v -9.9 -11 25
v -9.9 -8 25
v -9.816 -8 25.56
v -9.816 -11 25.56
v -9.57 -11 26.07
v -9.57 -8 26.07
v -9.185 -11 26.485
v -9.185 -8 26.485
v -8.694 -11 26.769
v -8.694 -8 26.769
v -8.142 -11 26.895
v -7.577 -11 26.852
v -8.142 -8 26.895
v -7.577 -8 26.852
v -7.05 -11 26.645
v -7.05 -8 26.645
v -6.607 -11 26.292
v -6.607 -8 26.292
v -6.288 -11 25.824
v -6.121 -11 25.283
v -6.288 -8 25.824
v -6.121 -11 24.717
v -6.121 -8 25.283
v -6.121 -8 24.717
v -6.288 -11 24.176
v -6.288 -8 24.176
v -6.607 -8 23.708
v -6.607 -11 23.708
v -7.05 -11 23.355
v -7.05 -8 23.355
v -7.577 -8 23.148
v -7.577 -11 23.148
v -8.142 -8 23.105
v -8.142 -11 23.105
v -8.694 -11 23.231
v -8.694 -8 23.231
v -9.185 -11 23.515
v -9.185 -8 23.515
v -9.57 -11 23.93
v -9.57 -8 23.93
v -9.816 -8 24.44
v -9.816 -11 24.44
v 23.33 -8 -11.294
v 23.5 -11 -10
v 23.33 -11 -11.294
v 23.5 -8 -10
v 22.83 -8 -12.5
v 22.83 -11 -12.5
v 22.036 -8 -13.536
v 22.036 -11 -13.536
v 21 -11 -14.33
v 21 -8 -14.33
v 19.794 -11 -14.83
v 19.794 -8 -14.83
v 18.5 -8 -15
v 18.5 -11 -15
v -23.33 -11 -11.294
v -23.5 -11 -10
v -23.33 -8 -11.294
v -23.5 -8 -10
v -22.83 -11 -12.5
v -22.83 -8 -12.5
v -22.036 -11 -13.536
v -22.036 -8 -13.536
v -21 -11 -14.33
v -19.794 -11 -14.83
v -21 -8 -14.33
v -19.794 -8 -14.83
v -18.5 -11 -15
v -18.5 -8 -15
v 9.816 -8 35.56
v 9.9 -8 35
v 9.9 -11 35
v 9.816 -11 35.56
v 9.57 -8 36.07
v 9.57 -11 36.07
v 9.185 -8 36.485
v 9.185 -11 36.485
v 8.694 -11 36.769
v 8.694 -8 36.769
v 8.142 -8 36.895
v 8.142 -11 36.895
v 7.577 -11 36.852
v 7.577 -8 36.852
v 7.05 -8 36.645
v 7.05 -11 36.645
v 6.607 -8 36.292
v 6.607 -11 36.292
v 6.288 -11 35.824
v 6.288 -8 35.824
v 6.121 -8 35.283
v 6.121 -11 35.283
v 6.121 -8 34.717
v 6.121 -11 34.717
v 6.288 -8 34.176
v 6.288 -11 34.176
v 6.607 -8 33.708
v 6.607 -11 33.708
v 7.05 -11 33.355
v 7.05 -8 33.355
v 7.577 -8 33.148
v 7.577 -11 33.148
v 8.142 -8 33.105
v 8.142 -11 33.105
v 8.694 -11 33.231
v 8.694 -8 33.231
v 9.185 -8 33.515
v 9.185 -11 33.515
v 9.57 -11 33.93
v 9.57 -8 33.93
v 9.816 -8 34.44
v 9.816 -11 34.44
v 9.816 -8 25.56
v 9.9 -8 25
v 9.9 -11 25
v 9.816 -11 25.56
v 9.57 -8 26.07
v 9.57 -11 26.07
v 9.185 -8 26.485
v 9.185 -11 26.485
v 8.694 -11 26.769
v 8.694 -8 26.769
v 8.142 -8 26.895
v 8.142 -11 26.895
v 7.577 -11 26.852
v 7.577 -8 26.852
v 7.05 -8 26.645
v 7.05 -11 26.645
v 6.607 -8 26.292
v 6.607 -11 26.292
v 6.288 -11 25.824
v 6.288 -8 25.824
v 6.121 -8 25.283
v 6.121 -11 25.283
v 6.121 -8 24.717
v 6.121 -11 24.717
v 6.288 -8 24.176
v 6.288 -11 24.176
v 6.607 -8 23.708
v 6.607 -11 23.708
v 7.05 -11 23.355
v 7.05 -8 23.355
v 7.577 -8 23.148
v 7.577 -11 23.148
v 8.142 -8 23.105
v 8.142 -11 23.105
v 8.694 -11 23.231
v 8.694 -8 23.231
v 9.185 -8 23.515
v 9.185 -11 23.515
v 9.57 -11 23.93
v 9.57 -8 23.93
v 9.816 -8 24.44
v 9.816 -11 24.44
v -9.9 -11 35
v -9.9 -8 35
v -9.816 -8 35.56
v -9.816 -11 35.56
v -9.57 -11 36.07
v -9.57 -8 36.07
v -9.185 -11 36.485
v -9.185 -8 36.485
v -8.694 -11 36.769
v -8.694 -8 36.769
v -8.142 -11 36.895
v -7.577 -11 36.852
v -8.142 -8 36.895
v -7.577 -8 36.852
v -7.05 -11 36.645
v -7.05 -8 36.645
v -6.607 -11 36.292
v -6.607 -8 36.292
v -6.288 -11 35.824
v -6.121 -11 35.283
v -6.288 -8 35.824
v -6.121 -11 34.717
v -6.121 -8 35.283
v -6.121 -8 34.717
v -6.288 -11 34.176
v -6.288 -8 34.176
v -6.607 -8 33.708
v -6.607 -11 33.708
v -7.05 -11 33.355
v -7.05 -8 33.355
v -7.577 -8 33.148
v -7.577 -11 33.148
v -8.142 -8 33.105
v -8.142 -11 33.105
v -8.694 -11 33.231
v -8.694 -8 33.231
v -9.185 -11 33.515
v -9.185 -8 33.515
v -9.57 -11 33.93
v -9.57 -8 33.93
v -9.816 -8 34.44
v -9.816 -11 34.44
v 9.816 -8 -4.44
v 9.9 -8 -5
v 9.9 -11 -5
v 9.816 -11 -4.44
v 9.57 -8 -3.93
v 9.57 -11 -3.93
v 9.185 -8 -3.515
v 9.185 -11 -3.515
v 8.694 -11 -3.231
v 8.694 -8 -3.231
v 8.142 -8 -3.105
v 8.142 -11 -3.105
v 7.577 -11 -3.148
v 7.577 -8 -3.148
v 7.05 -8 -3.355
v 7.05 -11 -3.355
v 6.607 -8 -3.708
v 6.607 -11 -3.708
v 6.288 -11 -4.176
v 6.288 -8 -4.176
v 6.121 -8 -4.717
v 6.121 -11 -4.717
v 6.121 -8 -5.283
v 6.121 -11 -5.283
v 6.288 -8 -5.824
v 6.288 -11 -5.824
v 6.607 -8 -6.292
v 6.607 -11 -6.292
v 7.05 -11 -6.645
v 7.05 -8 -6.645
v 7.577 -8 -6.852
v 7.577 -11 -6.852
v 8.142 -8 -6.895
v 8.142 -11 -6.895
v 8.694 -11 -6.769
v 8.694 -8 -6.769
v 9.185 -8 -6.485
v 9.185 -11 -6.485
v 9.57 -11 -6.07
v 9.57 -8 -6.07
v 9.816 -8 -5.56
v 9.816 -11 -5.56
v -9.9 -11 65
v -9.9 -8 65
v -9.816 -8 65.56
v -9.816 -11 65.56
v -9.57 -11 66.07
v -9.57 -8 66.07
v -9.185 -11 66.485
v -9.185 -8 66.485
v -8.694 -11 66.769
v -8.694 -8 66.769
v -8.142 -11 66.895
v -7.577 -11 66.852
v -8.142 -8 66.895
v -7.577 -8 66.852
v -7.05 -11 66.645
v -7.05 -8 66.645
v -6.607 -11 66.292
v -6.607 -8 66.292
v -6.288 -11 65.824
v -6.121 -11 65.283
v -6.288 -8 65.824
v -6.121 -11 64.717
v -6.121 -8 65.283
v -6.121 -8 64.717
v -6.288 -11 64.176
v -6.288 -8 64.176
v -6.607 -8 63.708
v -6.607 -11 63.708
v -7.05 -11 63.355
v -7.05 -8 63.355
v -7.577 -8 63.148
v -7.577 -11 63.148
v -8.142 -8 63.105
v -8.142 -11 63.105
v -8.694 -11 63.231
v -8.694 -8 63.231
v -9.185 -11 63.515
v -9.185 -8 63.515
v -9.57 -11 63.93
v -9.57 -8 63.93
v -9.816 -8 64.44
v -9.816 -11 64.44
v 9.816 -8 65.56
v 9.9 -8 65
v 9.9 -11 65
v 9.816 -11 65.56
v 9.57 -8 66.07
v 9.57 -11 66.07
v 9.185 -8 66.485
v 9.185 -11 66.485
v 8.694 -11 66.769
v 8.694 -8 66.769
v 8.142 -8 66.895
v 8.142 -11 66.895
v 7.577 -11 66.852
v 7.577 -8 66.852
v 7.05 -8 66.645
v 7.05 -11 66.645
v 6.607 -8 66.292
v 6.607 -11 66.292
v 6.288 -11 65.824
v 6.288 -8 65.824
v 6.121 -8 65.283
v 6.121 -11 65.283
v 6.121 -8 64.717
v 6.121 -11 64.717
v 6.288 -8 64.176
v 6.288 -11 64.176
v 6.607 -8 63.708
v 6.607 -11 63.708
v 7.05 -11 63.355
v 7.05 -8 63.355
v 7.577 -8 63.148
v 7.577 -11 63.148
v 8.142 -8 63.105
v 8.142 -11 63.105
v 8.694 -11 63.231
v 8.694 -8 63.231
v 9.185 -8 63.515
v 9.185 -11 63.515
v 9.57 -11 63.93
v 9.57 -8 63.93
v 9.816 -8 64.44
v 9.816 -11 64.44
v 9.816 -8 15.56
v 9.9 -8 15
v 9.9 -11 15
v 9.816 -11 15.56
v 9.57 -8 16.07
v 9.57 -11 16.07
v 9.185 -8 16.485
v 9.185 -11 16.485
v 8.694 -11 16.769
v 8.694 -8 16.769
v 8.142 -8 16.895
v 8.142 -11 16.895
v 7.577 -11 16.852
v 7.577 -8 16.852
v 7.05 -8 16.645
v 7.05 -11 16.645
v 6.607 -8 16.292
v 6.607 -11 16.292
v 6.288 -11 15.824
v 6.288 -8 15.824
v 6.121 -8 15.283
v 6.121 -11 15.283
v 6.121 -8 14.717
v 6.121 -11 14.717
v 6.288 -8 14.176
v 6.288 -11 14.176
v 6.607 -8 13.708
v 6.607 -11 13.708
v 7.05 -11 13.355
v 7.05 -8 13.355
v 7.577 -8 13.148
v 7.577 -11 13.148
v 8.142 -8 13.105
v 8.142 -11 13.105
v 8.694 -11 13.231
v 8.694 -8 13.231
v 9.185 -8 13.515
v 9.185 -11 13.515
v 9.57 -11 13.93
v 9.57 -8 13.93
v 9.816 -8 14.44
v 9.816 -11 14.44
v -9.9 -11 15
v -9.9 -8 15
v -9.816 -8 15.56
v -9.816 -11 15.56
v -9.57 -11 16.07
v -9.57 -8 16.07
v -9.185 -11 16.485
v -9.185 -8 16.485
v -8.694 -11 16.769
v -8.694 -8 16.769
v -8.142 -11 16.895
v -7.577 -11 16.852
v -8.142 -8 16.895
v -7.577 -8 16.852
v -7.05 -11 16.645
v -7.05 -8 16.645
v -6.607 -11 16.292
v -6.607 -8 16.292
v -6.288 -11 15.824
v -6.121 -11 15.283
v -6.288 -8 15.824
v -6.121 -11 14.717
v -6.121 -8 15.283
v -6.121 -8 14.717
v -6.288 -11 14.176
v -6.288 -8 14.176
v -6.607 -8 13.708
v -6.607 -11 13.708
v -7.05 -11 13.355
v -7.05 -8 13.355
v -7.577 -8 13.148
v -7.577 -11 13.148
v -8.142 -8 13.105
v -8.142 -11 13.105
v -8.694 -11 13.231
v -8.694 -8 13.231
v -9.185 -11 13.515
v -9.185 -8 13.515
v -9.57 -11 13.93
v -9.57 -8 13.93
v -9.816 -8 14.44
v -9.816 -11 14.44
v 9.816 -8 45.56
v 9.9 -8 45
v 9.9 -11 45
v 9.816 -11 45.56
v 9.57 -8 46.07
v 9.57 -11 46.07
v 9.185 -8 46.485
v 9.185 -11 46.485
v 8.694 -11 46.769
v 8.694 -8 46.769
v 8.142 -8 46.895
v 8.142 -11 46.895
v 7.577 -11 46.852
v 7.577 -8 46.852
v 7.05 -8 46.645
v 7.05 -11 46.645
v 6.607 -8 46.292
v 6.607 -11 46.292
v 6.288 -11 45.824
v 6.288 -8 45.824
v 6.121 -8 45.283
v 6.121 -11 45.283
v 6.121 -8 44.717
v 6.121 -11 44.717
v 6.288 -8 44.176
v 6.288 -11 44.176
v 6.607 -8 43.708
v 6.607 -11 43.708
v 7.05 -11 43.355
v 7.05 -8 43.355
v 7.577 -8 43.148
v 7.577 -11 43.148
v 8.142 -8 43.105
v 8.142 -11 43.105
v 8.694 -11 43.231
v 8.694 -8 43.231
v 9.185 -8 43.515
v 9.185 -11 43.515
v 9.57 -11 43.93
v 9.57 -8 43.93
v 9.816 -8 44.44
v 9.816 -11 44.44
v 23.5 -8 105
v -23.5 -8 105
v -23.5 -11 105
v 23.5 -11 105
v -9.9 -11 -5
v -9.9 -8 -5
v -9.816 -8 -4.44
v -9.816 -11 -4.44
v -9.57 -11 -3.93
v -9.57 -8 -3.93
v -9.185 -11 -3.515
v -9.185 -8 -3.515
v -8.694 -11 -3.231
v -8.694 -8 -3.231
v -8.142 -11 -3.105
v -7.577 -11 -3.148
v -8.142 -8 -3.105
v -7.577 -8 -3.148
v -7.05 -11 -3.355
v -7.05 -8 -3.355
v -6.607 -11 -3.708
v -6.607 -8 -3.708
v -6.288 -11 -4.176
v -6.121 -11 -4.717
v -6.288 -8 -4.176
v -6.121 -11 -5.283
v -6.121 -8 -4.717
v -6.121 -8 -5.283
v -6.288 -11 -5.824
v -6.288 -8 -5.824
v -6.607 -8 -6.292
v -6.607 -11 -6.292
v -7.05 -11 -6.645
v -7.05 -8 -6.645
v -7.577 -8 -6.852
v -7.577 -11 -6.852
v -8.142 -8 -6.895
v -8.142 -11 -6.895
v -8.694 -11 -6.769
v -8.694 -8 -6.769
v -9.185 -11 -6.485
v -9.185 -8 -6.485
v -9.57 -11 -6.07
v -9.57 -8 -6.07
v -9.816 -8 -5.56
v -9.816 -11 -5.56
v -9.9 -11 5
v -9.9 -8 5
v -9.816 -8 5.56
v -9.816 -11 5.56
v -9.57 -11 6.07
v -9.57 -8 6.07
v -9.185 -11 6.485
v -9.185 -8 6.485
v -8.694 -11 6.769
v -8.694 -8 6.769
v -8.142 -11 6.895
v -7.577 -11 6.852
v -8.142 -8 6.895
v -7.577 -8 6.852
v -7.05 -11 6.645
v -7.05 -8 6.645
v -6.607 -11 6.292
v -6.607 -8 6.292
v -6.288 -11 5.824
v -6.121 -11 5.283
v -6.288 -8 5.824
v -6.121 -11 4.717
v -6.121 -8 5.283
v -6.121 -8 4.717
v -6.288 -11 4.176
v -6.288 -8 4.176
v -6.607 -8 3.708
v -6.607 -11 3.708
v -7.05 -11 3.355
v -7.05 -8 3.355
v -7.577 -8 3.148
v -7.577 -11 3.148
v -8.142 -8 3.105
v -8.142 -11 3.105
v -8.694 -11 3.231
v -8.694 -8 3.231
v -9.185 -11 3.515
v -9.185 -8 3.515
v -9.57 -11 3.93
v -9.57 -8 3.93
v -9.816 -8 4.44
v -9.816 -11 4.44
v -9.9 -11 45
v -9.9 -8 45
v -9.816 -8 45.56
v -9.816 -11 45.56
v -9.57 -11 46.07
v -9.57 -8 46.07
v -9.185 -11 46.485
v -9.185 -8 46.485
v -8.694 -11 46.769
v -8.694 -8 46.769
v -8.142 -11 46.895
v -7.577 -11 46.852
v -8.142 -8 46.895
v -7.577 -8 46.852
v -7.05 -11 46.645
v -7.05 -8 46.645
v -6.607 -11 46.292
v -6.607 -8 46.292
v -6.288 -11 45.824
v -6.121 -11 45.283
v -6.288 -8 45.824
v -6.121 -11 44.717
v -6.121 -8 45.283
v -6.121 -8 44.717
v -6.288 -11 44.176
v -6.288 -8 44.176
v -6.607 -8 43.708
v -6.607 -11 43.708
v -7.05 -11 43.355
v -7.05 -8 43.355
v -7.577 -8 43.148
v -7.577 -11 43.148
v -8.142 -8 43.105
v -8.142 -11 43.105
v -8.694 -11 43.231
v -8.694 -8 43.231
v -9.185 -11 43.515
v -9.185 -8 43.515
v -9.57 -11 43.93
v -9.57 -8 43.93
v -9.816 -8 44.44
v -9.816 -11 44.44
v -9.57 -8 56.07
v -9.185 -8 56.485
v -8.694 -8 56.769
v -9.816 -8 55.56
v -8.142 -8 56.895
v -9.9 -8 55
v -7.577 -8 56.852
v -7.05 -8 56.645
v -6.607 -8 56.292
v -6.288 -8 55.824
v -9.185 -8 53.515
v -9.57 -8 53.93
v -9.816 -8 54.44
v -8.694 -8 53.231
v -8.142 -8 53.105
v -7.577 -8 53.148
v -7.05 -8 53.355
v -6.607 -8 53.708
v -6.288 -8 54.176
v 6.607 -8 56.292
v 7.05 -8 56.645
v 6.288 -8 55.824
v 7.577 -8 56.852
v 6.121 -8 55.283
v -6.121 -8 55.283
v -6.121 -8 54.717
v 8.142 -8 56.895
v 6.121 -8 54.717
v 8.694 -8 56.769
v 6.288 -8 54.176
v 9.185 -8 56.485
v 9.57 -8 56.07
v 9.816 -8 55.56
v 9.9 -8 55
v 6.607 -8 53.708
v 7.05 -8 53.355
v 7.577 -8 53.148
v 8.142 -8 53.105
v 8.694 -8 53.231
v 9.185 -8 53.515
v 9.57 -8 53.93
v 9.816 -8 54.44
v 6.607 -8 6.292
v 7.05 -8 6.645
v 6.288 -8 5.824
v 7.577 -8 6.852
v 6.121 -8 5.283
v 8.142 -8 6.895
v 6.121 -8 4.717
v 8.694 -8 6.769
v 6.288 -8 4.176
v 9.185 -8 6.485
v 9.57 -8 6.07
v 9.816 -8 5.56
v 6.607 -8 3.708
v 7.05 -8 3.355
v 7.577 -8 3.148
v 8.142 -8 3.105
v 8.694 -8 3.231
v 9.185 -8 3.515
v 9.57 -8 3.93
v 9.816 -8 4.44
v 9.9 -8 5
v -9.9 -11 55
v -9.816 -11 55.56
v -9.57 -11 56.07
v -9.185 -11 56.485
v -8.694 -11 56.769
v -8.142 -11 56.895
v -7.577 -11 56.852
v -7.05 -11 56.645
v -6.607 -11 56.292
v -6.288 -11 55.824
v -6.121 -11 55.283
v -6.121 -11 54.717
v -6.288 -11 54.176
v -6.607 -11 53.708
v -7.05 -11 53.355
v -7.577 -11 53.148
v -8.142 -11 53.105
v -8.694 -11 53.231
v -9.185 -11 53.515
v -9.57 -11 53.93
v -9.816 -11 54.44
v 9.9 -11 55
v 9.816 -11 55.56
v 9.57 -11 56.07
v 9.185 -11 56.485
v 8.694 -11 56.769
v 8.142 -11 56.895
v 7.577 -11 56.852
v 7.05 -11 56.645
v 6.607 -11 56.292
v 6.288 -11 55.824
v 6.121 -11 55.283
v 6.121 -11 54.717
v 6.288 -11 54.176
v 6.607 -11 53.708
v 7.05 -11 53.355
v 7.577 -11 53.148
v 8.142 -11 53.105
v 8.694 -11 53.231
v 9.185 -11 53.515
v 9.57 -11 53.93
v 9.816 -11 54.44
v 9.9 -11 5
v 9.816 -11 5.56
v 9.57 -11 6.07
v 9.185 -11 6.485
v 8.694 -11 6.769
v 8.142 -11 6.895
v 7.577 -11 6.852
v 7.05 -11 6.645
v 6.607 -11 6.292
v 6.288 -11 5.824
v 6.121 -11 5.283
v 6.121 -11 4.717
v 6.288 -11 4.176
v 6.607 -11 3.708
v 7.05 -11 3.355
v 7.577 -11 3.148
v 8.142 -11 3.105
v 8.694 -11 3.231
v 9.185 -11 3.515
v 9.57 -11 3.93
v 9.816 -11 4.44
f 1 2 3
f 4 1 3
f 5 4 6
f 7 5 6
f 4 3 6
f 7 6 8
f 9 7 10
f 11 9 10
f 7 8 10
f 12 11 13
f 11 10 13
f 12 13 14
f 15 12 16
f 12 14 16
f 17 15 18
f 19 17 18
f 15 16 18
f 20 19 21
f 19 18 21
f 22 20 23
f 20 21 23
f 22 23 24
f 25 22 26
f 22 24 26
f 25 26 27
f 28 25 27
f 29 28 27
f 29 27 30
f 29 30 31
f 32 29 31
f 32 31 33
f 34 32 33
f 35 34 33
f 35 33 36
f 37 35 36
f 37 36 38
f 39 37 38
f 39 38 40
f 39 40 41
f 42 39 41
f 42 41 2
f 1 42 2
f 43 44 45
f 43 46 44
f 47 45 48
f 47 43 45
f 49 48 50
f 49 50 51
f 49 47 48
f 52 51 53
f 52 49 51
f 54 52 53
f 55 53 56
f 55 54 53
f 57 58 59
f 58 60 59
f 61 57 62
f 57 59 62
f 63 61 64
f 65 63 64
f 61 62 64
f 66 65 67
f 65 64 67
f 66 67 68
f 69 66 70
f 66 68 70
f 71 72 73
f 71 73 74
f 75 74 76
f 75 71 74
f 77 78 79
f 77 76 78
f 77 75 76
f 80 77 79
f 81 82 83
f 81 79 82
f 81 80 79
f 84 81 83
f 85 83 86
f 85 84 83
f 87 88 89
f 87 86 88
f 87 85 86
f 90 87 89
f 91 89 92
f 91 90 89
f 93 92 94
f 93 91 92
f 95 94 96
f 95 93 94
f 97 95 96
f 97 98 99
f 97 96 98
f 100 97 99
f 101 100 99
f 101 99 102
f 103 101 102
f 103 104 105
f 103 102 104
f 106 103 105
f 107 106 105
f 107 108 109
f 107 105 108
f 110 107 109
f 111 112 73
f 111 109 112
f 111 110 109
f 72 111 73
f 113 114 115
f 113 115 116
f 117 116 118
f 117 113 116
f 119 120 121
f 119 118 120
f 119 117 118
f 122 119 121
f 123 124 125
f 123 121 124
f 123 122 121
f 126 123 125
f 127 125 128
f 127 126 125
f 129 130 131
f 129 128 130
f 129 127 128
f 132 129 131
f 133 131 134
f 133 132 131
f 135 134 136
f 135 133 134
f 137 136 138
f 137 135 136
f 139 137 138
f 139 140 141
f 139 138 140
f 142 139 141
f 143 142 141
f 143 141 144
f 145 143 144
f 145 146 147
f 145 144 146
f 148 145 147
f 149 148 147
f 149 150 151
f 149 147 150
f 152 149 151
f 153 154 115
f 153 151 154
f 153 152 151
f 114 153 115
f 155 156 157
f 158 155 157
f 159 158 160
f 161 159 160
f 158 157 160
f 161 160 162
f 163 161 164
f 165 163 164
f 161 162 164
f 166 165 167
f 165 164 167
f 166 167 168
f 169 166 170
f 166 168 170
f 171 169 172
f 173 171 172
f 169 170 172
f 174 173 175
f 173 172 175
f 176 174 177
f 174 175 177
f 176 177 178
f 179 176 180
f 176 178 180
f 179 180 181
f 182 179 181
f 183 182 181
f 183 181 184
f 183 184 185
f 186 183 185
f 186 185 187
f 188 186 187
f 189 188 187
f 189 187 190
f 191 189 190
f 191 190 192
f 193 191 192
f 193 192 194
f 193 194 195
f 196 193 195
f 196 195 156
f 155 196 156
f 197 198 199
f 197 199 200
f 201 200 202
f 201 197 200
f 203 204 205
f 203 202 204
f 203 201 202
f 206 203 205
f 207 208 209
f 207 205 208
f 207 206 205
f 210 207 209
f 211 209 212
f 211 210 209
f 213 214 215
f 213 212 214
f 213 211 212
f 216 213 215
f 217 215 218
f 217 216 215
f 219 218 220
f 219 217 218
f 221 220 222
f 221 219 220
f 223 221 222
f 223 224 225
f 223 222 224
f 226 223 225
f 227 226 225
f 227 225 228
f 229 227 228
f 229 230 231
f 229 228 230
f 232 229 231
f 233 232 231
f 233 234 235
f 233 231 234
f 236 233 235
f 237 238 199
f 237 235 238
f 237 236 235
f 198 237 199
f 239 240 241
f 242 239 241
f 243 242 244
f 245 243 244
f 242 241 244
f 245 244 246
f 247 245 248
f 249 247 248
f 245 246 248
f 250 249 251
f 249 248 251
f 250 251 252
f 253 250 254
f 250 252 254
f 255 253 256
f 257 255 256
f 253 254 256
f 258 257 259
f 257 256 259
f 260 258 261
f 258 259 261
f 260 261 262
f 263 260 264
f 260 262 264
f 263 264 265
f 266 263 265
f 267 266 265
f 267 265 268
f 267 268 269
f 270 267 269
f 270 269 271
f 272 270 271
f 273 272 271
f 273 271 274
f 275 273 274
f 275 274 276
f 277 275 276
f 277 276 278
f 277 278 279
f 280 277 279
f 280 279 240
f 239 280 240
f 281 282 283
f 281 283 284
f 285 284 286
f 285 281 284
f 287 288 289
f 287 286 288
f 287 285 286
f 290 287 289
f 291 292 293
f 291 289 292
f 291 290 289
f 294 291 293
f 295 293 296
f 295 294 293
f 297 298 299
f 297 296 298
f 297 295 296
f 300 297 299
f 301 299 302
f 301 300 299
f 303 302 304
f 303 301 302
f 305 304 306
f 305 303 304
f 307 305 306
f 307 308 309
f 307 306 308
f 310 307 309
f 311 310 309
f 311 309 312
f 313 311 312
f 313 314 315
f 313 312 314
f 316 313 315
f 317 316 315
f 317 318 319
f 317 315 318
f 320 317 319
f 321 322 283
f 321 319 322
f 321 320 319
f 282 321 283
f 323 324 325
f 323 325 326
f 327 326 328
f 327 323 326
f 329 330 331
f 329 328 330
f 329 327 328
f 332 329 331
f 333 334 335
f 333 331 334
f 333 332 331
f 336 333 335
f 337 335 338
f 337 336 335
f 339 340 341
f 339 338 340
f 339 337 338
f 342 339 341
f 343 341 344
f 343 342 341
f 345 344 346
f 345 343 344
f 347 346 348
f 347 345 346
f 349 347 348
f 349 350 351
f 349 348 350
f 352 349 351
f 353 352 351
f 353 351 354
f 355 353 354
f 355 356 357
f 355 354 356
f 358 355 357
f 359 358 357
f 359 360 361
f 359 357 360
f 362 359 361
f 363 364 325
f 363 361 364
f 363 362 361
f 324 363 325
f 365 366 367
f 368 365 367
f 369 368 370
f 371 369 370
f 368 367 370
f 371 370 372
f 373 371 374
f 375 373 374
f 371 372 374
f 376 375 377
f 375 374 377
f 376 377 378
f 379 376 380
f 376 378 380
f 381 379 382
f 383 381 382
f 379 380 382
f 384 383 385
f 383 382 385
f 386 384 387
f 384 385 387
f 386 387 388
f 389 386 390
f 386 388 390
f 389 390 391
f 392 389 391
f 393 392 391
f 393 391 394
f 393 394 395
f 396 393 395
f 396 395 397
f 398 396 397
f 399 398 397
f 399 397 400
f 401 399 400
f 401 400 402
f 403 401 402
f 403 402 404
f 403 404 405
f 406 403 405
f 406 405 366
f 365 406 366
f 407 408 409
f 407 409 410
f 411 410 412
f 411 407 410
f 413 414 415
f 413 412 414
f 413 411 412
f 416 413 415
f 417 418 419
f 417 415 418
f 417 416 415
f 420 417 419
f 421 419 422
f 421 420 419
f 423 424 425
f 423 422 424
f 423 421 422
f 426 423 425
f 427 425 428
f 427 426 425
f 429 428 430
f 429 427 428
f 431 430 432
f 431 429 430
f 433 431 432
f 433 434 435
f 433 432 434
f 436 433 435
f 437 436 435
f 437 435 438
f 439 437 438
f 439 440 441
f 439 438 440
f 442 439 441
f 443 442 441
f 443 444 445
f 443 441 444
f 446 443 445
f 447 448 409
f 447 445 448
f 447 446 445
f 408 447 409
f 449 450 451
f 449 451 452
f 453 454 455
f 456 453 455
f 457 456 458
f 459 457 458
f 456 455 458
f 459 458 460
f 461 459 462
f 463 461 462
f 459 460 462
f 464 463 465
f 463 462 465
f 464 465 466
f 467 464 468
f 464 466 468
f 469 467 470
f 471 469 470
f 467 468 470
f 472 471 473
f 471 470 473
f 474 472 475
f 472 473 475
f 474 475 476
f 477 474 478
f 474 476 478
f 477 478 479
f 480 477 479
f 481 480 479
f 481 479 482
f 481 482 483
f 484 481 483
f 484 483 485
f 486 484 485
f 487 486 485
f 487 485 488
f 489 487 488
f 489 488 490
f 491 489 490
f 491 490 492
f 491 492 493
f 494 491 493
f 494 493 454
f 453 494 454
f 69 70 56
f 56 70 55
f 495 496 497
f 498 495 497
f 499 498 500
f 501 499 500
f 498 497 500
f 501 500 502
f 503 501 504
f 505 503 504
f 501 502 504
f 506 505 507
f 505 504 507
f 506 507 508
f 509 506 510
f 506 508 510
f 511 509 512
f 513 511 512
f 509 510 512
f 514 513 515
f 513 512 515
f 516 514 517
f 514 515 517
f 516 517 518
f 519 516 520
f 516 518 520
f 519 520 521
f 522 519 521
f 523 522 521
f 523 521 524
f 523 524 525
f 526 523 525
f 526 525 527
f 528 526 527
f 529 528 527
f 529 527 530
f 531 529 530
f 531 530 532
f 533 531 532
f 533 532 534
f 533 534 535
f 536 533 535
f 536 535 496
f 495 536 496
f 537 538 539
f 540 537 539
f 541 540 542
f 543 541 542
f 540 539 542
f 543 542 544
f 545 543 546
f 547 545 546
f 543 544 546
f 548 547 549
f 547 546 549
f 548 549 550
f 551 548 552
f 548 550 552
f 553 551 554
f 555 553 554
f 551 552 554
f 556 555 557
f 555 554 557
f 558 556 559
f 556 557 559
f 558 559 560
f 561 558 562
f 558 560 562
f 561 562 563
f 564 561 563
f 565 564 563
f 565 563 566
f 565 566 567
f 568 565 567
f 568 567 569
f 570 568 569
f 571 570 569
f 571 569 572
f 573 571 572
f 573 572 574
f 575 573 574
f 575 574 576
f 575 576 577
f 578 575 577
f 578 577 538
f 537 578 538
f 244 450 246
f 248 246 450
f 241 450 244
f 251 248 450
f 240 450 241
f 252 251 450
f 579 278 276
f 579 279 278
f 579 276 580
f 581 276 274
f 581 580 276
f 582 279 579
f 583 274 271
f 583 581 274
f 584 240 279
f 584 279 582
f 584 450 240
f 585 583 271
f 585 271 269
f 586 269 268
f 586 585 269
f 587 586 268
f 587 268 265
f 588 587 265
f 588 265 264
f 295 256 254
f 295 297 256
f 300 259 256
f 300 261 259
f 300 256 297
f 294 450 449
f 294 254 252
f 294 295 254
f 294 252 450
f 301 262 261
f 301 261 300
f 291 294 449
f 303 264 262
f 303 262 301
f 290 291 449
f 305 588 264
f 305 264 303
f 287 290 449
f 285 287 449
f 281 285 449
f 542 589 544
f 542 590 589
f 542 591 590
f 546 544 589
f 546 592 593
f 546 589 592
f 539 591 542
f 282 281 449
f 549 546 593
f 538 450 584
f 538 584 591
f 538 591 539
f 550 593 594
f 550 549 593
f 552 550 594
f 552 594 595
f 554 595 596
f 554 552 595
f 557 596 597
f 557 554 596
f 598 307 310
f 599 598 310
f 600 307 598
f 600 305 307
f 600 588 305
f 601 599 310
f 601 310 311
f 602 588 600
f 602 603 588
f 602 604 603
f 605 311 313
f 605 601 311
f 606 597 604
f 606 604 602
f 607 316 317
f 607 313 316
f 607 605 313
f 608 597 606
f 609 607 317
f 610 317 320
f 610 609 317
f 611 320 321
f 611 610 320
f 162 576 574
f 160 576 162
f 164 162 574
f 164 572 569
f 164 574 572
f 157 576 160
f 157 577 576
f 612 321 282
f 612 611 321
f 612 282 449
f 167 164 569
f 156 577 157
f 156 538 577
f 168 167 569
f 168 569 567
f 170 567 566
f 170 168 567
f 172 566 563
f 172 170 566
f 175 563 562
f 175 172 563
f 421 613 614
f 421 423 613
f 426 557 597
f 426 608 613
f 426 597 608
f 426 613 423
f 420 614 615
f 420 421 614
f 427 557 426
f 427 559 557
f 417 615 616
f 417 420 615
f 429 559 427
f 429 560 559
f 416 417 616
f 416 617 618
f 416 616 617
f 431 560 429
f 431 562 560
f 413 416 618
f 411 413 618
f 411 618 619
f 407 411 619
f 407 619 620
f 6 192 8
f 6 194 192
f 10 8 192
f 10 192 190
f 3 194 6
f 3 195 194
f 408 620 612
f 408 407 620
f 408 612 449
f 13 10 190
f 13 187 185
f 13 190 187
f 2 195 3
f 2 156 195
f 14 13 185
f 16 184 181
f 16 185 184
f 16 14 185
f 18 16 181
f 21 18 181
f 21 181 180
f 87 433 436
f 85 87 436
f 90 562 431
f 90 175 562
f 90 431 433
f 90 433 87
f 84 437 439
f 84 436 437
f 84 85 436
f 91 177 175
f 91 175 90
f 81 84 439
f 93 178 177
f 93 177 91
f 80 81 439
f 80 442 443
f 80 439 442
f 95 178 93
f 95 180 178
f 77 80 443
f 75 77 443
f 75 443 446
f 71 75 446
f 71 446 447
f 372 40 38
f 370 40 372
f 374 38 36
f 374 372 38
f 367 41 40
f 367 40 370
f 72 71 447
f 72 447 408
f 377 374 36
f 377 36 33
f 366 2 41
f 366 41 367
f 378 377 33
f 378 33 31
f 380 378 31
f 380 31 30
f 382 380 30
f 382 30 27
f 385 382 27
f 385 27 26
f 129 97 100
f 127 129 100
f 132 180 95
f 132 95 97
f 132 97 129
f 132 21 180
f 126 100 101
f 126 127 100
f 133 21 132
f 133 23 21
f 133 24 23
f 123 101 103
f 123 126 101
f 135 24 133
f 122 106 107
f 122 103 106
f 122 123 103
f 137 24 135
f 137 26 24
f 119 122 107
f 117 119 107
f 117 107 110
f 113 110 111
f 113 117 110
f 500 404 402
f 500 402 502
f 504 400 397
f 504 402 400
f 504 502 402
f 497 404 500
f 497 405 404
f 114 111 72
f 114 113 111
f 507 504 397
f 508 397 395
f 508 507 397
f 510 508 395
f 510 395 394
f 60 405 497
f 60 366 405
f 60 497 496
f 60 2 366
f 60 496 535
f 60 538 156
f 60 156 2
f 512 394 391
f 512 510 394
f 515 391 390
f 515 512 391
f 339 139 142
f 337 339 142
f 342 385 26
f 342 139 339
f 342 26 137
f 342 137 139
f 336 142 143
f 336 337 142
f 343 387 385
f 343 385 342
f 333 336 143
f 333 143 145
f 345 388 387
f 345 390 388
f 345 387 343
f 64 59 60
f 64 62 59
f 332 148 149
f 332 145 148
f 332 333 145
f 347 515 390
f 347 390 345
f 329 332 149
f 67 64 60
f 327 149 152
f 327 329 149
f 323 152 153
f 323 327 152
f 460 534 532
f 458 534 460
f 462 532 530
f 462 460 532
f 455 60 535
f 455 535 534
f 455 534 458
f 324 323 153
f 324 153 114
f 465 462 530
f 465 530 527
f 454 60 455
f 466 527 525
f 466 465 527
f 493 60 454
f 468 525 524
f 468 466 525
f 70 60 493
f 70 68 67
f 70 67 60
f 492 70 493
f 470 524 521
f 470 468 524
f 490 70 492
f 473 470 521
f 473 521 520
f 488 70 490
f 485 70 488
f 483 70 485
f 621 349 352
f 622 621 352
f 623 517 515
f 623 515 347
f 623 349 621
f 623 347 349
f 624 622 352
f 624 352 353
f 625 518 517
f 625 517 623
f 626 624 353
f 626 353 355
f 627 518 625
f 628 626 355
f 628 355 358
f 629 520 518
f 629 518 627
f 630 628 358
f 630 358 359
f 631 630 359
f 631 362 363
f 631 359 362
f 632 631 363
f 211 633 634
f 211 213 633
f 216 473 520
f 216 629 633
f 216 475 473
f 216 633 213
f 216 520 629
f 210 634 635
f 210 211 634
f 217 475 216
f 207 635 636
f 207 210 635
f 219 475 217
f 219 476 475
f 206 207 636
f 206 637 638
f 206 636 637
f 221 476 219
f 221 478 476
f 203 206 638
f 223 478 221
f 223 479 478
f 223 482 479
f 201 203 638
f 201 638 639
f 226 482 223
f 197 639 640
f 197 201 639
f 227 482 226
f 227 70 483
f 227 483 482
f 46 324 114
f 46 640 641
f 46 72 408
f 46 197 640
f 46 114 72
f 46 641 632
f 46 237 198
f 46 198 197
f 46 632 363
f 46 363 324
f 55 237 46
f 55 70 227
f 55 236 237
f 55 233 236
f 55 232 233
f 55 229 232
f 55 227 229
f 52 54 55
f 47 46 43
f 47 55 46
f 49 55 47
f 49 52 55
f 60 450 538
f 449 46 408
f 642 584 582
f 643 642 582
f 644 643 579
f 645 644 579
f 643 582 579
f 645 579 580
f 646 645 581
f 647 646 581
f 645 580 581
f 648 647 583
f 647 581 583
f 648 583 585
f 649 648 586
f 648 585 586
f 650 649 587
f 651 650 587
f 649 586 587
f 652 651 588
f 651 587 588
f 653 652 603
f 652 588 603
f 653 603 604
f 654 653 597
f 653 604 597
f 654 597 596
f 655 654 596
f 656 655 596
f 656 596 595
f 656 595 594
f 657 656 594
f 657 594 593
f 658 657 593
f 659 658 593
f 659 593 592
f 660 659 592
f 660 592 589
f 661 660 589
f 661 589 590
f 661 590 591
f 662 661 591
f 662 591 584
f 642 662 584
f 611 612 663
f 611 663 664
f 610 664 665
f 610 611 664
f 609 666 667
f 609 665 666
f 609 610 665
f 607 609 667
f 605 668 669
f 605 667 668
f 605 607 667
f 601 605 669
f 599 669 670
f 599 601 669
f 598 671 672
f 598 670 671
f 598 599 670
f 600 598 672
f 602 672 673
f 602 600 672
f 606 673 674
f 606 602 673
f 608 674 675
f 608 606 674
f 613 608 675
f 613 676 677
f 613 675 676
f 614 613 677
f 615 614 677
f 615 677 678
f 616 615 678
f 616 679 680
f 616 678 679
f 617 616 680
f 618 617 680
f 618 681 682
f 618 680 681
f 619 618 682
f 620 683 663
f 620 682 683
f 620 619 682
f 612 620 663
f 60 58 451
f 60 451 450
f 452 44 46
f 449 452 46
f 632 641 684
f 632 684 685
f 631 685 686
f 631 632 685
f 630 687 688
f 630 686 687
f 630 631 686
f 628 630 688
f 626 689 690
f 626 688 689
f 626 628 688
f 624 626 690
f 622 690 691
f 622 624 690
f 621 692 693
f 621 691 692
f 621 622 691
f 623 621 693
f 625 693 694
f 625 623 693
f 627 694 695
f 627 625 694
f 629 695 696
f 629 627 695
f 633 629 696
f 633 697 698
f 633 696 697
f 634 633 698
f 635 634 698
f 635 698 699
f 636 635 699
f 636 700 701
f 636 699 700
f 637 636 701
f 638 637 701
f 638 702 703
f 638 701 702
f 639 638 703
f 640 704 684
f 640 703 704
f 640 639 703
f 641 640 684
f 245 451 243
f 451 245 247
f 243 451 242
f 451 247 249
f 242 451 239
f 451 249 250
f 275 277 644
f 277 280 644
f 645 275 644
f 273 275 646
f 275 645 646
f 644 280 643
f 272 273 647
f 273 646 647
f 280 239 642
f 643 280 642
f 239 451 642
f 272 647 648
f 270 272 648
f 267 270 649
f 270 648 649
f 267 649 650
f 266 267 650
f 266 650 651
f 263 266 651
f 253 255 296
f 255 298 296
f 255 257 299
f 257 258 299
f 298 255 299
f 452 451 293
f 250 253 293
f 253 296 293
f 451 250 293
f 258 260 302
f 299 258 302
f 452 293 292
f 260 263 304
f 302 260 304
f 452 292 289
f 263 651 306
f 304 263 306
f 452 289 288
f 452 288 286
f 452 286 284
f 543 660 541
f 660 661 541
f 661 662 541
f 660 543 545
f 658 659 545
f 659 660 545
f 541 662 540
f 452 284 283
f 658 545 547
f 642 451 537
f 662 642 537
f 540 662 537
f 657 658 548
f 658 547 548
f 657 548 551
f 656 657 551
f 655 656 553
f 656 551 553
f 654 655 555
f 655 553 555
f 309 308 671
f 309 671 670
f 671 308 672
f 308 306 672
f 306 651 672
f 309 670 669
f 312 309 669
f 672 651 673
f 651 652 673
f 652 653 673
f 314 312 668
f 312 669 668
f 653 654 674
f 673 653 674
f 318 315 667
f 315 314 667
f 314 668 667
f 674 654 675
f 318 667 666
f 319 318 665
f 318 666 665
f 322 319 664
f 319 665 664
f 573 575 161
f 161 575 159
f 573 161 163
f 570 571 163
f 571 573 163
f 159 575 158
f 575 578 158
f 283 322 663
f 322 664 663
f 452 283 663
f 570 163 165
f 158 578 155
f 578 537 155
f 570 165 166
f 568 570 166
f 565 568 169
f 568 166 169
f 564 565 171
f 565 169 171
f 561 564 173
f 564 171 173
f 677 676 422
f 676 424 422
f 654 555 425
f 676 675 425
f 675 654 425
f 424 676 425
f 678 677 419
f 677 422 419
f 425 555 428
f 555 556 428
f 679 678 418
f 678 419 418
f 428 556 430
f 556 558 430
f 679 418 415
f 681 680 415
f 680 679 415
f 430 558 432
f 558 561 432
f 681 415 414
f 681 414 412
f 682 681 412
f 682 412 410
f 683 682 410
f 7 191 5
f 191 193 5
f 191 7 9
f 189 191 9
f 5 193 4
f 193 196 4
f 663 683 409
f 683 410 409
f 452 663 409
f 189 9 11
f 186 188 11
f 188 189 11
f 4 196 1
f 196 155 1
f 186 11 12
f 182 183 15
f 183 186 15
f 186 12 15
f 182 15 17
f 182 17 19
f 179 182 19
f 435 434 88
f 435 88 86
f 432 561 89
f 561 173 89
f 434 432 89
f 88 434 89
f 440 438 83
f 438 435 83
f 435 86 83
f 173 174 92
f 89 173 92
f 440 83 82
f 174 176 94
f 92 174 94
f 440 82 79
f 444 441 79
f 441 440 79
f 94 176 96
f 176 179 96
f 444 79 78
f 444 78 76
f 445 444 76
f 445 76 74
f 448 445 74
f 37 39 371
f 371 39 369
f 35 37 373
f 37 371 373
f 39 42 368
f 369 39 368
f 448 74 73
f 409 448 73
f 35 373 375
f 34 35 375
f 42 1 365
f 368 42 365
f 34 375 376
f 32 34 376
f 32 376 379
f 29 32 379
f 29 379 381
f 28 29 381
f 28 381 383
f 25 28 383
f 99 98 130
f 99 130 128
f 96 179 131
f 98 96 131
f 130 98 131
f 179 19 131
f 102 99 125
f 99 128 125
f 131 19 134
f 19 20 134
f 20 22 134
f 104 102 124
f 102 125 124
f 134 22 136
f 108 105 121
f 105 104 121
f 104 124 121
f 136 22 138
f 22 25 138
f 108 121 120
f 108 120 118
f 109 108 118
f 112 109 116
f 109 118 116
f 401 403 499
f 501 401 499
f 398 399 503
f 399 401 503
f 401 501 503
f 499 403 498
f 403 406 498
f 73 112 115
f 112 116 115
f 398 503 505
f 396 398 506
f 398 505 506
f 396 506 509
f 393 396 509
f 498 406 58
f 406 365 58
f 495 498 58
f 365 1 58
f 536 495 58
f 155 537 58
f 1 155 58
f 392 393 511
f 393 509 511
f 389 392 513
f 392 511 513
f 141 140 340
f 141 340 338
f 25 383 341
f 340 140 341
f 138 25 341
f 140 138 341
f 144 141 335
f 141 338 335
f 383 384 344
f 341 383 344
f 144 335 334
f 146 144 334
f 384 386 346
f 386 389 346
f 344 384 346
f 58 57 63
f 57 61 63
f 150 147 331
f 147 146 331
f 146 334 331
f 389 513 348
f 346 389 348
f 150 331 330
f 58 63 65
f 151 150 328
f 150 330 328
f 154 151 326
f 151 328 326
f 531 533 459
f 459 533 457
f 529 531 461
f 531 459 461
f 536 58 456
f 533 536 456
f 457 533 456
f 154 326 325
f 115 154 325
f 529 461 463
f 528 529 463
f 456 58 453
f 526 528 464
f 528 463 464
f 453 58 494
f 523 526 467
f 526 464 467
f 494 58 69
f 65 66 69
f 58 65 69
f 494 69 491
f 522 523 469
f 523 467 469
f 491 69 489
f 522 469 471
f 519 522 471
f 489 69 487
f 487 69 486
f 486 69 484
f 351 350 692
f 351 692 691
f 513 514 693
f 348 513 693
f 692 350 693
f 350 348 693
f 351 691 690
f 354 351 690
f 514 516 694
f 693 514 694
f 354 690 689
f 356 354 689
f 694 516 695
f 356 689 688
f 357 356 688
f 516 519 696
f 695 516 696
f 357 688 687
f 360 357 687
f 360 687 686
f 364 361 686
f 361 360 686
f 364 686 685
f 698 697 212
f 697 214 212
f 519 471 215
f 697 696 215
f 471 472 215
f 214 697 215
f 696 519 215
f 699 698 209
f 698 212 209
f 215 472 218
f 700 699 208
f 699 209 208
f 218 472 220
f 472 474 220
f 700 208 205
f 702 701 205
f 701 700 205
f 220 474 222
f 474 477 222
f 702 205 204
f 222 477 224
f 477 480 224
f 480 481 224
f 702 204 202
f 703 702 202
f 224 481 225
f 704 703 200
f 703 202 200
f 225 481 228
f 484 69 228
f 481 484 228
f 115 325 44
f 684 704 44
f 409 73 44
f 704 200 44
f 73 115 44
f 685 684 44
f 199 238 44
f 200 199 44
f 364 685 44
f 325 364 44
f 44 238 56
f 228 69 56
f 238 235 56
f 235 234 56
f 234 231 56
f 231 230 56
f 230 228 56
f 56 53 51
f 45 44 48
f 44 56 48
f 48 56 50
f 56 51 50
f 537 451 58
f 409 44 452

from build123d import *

# Parameters (mm, degrees)
CYLINDER002_R     = 1.9
CYLINDER002_DEPTH = 20
ARRAY003_Z_COUNT  = 8
ARRAY003_Z_PITCH  = 10
BOX003_W          = 47
BOX003_H          = 3
BOX003_DEPTH      = 120
FILLET003_R       = 5


with BuildPart() as laser_attachment_hole:
    # Cylinder002 → Cylinder002 (new body)
    with BuildSketch(Plane(origin=(8, 0, 0), x_dir=(1, 0, 0), z_dir=(0, -1, 0))):
        Circle(CYLINDER002_R)
    extrude(amount=CYLINDER002_DEPTH)


with BuildPart() as laser_hole_array:
    # Part__Mirroring003: instance of laser attachment hole
    add(laser_attachment_hole.part.mirror(Plane(origin=(0, 0, 0), x_dir=(0, -1, 0), z_dir=(1, 0, 0))))

    # Fusion002: union laser attachment hole
    add(laser_attachment_hole.part)

    # Array003 Z: laser hole array ×8


with BuildPart() as laser_hole_array_1:
    add(laser_hole_array.part)
    with Locations(*[(0, 0, i * ARRAY003_Z_PITCH) for i in range(1, ARRAY003_Z_COUNT)]):
        add(laser_hole_array.part)


with BuildPart() as laser_hole_array_2:
    # Array003 placement: moved
    add(laser_hole_array_1.part.moved(Location((0, 0, -5))))


with BuildPart() as holder_with_holes:
    # Box003 → Box003 (new body)
    with BuildSketch(Plane(origin=(-23.5, -11, -15), x_dir=(1, 0, 0), z_dir=(0, 0, 1))):
        with Locations((23.5, 1.5)):
            Rectangle(BOX003_W, BOX003_H)
    extrude(amount=BOX003_DEPTH)

    # Fillet003
    fillet003_edges = [holder_with_holes.edges().sort_by_distance(p)[0] for p in [
        (-23.5, -9.5, -15),
        (23.5, -9.5, -15),
    ]]
    fillet(fillet003_edges, radius=FILLET003_R)

    # Cut002: cut laser hole array
    add(laser_hole_array_2.part, mode=Mode.SUBTRACT)


solid = holder_with_holes.part
